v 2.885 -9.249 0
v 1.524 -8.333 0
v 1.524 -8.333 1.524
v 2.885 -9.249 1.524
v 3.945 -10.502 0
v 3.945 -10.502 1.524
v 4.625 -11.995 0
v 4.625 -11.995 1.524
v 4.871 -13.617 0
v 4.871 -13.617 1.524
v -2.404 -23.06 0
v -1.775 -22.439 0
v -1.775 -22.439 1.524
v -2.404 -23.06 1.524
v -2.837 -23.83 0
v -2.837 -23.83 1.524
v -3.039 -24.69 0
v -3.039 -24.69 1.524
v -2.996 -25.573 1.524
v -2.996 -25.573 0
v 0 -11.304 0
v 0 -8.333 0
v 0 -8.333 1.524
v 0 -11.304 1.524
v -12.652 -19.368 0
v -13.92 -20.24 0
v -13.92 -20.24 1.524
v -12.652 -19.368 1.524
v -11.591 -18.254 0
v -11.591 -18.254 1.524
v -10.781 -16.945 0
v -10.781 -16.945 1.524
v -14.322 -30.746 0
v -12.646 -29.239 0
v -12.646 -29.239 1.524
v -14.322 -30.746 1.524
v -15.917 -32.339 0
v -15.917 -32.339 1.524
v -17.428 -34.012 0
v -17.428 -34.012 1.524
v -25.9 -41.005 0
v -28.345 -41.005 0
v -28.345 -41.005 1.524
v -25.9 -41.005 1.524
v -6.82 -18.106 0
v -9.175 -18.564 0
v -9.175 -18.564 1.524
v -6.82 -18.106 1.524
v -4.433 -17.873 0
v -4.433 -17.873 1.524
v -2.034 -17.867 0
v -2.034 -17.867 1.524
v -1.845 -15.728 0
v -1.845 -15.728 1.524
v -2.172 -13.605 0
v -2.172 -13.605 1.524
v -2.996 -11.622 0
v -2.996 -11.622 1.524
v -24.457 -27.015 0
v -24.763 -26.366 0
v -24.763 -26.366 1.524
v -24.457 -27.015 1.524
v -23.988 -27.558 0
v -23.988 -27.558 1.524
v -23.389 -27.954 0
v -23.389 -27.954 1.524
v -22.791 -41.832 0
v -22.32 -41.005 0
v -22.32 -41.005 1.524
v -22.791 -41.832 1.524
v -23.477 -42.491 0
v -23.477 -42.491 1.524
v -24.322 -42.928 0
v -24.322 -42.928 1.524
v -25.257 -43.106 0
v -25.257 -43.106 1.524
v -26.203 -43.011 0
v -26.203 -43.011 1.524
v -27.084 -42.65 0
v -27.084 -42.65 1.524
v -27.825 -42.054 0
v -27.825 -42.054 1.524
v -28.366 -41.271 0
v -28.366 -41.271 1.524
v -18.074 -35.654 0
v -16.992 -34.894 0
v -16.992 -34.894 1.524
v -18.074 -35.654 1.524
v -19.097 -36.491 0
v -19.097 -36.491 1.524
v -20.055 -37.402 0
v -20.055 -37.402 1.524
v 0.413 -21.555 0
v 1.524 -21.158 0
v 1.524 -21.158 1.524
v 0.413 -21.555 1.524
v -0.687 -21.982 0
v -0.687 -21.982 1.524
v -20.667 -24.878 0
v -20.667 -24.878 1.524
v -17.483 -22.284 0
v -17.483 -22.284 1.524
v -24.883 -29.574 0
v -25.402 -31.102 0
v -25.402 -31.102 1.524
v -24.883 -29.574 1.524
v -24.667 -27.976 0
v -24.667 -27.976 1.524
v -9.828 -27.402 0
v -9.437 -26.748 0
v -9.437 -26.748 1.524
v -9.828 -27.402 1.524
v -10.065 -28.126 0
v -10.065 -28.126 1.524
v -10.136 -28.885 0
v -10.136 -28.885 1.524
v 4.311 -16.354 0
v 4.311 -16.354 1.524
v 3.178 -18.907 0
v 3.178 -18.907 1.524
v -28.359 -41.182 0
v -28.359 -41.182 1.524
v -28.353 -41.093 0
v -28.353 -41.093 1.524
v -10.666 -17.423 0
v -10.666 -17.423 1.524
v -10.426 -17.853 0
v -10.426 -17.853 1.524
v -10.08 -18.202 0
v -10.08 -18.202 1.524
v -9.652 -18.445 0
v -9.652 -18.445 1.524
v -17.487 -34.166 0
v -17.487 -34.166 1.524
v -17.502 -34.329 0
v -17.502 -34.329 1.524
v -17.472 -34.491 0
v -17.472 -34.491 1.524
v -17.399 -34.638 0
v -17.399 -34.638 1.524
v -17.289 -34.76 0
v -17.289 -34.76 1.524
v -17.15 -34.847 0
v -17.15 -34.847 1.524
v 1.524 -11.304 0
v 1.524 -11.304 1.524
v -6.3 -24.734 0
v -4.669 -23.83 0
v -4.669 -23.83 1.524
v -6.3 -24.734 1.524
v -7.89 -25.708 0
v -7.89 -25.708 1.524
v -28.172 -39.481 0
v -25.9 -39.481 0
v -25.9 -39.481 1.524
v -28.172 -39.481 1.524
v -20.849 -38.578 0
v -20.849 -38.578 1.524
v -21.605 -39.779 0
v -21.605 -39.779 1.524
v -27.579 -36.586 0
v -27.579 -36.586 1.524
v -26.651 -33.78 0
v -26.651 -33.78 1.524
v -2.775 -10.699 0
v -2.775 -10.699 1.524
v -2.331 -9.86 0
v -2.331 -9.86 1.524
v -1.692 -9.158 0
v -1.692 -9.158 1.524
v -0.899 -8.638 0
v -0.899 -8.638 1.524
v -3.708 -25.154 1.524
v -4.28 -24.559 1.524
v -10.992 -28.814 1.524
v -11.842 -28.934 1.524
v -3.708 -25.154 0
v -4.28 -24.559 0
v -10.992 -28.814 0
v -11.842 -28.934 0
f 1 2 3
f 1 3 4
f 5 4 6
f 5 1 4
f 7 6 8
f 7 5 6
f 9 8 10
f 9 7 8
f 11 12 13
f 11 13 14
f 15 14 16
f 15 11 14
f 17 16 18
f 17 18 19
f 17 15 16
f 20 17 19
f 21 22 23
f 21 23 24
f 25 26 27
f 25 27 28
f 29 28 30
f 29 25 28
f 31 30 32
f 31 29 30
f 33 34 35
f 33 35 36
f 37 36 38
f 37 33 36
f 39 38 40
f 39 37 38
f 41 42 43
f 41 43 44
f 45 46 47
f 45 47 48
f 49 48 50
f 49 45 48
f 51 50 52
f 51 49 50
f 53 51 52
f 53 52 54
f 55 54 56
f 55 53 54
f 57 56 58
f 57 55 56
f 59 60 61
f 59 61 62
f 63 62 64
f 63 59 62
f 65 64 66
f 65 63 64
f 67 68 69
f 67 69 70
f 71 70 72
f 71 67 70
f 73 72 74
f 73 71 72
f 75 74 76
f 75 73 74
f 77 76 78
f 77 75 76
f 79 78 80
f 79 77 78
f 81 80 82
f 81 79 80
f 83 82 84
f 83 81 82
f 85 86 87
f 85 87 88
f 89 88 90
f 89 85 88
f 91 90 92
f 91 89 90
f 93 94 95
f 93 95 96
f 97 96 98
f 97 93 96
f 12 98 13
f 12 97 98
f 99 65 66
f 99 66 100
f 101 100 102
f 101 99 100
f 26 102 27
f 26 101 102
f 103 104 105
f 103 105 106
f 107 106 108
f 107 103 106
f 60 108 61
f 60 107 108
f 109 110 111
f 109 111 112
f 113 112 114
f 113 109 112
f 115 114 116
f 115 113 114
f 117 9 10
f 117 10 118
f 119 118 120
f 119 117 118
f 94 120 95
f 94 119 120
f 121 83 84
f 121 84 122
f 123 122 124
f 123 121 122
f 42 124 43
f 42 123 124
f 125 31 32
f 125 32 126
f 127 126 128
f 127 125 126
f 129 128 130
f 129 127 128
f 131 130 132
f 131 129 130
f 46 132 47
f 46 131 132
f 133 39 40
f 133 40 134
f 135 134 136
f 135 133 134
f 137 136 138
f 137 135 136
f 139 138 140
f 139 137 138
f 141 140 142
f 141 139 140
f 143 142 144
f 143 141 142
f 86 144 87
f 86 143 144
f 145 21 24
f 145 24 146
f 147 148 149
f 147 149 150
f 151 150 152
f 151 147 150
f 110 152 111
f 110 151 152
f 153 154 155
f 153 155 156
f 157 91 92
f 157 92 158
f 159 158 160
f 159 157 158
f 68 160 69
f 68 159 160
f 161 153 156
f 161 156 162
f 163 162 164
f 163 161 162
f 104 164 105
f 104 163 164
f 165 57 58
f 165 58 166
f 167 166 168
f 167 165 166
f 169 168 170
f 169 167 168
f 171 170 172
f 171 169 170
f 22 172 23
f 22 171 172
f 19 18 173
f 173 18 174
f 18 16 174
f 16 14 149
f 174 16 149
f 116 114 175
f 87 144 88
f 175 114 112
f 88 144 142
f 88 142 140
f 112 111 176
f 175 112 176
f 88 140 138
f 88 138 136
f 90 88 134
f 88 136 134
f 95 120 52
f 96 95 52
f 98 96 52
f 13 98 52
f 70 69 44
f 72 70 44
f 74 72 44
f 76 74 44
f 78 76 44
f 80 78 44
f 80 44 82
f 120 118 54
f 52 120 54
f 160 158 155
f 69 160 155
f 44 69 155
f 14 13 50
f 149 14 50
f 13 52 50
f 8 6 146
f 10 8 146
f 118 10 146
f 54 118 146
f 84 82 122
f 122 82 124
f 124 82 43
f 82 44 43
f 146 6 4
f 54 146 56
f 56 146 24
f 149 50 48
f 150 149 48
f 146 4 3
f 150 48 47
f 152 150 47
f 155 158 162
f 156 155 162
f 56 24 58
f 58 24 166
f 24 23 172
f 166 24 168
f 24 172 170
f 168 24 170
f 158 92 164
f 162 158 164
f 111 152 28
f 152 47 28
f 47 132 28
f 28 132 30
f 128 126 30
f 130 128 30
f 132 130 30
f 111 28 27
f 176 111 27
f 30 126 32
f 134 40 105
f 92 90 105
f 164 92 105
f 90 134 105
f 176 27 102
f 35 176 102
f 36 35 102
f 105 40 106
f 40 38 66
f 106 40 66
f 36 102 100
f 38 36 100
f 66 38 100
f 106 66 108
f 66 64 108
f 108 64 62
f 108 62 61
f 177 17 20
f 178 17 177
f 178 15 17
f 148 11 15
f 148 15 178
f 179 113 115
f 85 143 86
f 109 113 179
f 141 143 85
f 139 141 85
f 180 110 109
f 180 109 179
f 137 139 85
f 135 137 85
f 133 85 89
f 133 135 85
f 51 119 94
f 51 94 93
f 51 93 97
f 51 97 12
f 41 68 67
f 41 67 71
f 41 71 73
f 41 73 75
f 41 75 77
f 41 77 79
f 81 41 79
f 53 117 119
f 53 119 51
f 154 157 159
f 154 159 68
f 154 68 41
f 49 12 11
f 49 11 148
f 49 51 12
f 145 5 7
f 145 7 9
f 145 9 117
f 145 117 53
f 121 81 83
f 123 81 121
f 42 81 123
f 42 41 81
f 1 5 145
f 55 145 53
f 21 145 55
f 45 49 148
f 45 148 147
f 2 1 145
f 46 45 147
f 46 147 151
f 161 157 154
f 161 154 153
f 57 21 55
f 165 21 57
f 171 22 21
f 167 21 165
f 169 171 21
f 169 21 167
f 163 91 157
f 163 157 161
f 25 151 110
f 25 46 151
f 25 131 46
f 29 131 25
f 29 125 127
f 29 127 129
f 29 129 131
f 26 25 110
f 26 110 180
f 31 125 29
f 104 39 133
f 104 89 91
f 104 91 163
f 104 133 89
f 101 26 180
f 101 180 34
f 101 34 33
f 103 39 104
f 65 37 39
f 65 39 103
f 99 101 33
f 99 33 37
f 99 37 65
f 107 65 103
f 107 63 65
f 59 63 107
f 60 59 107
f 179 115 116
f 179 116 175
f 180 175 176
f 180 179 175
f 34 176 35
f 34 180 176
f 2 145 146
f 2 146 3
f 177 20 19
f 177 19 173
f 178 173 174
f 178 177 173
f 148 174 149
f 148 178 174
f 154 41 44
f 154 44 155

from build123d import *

# Parameters (mm, degrees)
BOSS_EXTRUDE1_DEPTH = 1.524


with BuildPart() as part:
    # Sketch1 → Boss-Extrude1 (new body)
    with BuildSketch(Plane.XY):
        with BuildLine():
            Line((0, -11.304143944), (1.524, -11.304143944))
            Line((1.524, -11.304143944), (1.524, -8.333085901))
            ThreePointArc((1.524, -8.333085901), (3.945438138, -10.501523778), (4.87145261, -13.617287357))
            ThreePointArc((4.87145261, -13.617287357), (3.813444714, -17.660873454), (1.524, -21.157788112))
            ThreePointArc((1.524, -21.157788112), (-0.138732581, -21.765001835), (-1.77540365, -22.4393133))
            ThreePointArc((-1.77540365, -22.4393133), (-2.836636029, -23.830223279), (-2.99560227, -25.572513285))
            ThreePointArc((-2.99560227, -25.572513285), (-4.014612166, -24.876344883), (-4.669334398, -23.830223279))
            ThreePointArc((-4.669334398, -23.830223279), (-7.100142825, -25.212490369), (-9.437186958, -26.747976168))
            ThreePointArc((-9.437186958, -26.747976168), (-9.966611367, -27.75761792), (-10.13579223, -28.885024017))
            ThreePointArc((-10.13579223, -28.885024017), (-11.420458761, -28.850541305), (-12.64562455, -29.238518038))
            ThreePointArc((-12.64562455, -29.238518038), (-15.129726879, -31.532392213), (-17.428294378, -34.012152396))
            ThreePointArc((-17.428294378, -34.012152396), (-17.440615342, -34.566818357), (-16.992461897, -34.893872824))
            ThreePointArc((-16.992461897, -34.893872824), (-18.592932451, -36.063409356), (-20.055394787, -37.401514587))
            ThreePointArc((-20.055394787, -37.401514587), (-21.23200408, -39.175477677), (-22.32048354, -41.004840118))
            ThreePointArc((-22.32048354, -41.004840118), (-25.256637968, -43.106248561), (-28.366018586, -41.270854206))
            ThreePointArc((-28.366018586, -41.270854206), (-28.356027092, -41.137819843), (-28.345332967, -41.004840118))
            Line((-28.345332967, -41.004840118), (-25.899875794, -41.004840118))
            Line((-25.899875794, -41.004840118), (-25.899875794, -39.480840118))
            Line((-25.899875794, -39.480840118), (-28.171982443, -39.480840118))
            ThreePointArc((-28.171982443, -39.480840118), (-27.155881735, -35.169299836), (-25.402070376, -31.10162409))
            ThreePointArc((-25.402070376, -31.10162409), (-24.736304523, -28.780464694), (-24.763169881, -26.365862581))
            ThreePointArc((-24.763169881, -26.365862581), (-24.241136691, -27.302583764), (-23.389289994, -27.953984126))
            ThreePointArc((-23.389289994, -27.953984126), (-19.127839076, -23.515816288), (-13.919621322, -20.239878938))
            ThreePointArc((-13.919621322, -20.239878938), (-12.092421111, -18.838162319), (-10.781391169, -16.944839687))
            ThreePointArc((-10.781391169, -16.944839687), (-10.265088251, -18.039159093), (-9.174768374, -18.563855417))
            ThreePointArc((-9.174768374, -18.563855417), (-5.629295434, -17.960763676), (-2.03410657, -17.86740925))
            ThreePointArc((-2.03410657, -17.86740925), (-1.944710685, -14.656928393), (-2.99560227, -11.621997448))
            ThreePointArc((-2.99560227, -11.621997448), (-2.03410657, -9.489064634), (0, -8.333085901))
            Line((0, -8.333085901), (0, -11.304143944))
        make_face()
    extrude(amount=BOSS_EXTRUDE1_DEPTH)


solid = part.part
